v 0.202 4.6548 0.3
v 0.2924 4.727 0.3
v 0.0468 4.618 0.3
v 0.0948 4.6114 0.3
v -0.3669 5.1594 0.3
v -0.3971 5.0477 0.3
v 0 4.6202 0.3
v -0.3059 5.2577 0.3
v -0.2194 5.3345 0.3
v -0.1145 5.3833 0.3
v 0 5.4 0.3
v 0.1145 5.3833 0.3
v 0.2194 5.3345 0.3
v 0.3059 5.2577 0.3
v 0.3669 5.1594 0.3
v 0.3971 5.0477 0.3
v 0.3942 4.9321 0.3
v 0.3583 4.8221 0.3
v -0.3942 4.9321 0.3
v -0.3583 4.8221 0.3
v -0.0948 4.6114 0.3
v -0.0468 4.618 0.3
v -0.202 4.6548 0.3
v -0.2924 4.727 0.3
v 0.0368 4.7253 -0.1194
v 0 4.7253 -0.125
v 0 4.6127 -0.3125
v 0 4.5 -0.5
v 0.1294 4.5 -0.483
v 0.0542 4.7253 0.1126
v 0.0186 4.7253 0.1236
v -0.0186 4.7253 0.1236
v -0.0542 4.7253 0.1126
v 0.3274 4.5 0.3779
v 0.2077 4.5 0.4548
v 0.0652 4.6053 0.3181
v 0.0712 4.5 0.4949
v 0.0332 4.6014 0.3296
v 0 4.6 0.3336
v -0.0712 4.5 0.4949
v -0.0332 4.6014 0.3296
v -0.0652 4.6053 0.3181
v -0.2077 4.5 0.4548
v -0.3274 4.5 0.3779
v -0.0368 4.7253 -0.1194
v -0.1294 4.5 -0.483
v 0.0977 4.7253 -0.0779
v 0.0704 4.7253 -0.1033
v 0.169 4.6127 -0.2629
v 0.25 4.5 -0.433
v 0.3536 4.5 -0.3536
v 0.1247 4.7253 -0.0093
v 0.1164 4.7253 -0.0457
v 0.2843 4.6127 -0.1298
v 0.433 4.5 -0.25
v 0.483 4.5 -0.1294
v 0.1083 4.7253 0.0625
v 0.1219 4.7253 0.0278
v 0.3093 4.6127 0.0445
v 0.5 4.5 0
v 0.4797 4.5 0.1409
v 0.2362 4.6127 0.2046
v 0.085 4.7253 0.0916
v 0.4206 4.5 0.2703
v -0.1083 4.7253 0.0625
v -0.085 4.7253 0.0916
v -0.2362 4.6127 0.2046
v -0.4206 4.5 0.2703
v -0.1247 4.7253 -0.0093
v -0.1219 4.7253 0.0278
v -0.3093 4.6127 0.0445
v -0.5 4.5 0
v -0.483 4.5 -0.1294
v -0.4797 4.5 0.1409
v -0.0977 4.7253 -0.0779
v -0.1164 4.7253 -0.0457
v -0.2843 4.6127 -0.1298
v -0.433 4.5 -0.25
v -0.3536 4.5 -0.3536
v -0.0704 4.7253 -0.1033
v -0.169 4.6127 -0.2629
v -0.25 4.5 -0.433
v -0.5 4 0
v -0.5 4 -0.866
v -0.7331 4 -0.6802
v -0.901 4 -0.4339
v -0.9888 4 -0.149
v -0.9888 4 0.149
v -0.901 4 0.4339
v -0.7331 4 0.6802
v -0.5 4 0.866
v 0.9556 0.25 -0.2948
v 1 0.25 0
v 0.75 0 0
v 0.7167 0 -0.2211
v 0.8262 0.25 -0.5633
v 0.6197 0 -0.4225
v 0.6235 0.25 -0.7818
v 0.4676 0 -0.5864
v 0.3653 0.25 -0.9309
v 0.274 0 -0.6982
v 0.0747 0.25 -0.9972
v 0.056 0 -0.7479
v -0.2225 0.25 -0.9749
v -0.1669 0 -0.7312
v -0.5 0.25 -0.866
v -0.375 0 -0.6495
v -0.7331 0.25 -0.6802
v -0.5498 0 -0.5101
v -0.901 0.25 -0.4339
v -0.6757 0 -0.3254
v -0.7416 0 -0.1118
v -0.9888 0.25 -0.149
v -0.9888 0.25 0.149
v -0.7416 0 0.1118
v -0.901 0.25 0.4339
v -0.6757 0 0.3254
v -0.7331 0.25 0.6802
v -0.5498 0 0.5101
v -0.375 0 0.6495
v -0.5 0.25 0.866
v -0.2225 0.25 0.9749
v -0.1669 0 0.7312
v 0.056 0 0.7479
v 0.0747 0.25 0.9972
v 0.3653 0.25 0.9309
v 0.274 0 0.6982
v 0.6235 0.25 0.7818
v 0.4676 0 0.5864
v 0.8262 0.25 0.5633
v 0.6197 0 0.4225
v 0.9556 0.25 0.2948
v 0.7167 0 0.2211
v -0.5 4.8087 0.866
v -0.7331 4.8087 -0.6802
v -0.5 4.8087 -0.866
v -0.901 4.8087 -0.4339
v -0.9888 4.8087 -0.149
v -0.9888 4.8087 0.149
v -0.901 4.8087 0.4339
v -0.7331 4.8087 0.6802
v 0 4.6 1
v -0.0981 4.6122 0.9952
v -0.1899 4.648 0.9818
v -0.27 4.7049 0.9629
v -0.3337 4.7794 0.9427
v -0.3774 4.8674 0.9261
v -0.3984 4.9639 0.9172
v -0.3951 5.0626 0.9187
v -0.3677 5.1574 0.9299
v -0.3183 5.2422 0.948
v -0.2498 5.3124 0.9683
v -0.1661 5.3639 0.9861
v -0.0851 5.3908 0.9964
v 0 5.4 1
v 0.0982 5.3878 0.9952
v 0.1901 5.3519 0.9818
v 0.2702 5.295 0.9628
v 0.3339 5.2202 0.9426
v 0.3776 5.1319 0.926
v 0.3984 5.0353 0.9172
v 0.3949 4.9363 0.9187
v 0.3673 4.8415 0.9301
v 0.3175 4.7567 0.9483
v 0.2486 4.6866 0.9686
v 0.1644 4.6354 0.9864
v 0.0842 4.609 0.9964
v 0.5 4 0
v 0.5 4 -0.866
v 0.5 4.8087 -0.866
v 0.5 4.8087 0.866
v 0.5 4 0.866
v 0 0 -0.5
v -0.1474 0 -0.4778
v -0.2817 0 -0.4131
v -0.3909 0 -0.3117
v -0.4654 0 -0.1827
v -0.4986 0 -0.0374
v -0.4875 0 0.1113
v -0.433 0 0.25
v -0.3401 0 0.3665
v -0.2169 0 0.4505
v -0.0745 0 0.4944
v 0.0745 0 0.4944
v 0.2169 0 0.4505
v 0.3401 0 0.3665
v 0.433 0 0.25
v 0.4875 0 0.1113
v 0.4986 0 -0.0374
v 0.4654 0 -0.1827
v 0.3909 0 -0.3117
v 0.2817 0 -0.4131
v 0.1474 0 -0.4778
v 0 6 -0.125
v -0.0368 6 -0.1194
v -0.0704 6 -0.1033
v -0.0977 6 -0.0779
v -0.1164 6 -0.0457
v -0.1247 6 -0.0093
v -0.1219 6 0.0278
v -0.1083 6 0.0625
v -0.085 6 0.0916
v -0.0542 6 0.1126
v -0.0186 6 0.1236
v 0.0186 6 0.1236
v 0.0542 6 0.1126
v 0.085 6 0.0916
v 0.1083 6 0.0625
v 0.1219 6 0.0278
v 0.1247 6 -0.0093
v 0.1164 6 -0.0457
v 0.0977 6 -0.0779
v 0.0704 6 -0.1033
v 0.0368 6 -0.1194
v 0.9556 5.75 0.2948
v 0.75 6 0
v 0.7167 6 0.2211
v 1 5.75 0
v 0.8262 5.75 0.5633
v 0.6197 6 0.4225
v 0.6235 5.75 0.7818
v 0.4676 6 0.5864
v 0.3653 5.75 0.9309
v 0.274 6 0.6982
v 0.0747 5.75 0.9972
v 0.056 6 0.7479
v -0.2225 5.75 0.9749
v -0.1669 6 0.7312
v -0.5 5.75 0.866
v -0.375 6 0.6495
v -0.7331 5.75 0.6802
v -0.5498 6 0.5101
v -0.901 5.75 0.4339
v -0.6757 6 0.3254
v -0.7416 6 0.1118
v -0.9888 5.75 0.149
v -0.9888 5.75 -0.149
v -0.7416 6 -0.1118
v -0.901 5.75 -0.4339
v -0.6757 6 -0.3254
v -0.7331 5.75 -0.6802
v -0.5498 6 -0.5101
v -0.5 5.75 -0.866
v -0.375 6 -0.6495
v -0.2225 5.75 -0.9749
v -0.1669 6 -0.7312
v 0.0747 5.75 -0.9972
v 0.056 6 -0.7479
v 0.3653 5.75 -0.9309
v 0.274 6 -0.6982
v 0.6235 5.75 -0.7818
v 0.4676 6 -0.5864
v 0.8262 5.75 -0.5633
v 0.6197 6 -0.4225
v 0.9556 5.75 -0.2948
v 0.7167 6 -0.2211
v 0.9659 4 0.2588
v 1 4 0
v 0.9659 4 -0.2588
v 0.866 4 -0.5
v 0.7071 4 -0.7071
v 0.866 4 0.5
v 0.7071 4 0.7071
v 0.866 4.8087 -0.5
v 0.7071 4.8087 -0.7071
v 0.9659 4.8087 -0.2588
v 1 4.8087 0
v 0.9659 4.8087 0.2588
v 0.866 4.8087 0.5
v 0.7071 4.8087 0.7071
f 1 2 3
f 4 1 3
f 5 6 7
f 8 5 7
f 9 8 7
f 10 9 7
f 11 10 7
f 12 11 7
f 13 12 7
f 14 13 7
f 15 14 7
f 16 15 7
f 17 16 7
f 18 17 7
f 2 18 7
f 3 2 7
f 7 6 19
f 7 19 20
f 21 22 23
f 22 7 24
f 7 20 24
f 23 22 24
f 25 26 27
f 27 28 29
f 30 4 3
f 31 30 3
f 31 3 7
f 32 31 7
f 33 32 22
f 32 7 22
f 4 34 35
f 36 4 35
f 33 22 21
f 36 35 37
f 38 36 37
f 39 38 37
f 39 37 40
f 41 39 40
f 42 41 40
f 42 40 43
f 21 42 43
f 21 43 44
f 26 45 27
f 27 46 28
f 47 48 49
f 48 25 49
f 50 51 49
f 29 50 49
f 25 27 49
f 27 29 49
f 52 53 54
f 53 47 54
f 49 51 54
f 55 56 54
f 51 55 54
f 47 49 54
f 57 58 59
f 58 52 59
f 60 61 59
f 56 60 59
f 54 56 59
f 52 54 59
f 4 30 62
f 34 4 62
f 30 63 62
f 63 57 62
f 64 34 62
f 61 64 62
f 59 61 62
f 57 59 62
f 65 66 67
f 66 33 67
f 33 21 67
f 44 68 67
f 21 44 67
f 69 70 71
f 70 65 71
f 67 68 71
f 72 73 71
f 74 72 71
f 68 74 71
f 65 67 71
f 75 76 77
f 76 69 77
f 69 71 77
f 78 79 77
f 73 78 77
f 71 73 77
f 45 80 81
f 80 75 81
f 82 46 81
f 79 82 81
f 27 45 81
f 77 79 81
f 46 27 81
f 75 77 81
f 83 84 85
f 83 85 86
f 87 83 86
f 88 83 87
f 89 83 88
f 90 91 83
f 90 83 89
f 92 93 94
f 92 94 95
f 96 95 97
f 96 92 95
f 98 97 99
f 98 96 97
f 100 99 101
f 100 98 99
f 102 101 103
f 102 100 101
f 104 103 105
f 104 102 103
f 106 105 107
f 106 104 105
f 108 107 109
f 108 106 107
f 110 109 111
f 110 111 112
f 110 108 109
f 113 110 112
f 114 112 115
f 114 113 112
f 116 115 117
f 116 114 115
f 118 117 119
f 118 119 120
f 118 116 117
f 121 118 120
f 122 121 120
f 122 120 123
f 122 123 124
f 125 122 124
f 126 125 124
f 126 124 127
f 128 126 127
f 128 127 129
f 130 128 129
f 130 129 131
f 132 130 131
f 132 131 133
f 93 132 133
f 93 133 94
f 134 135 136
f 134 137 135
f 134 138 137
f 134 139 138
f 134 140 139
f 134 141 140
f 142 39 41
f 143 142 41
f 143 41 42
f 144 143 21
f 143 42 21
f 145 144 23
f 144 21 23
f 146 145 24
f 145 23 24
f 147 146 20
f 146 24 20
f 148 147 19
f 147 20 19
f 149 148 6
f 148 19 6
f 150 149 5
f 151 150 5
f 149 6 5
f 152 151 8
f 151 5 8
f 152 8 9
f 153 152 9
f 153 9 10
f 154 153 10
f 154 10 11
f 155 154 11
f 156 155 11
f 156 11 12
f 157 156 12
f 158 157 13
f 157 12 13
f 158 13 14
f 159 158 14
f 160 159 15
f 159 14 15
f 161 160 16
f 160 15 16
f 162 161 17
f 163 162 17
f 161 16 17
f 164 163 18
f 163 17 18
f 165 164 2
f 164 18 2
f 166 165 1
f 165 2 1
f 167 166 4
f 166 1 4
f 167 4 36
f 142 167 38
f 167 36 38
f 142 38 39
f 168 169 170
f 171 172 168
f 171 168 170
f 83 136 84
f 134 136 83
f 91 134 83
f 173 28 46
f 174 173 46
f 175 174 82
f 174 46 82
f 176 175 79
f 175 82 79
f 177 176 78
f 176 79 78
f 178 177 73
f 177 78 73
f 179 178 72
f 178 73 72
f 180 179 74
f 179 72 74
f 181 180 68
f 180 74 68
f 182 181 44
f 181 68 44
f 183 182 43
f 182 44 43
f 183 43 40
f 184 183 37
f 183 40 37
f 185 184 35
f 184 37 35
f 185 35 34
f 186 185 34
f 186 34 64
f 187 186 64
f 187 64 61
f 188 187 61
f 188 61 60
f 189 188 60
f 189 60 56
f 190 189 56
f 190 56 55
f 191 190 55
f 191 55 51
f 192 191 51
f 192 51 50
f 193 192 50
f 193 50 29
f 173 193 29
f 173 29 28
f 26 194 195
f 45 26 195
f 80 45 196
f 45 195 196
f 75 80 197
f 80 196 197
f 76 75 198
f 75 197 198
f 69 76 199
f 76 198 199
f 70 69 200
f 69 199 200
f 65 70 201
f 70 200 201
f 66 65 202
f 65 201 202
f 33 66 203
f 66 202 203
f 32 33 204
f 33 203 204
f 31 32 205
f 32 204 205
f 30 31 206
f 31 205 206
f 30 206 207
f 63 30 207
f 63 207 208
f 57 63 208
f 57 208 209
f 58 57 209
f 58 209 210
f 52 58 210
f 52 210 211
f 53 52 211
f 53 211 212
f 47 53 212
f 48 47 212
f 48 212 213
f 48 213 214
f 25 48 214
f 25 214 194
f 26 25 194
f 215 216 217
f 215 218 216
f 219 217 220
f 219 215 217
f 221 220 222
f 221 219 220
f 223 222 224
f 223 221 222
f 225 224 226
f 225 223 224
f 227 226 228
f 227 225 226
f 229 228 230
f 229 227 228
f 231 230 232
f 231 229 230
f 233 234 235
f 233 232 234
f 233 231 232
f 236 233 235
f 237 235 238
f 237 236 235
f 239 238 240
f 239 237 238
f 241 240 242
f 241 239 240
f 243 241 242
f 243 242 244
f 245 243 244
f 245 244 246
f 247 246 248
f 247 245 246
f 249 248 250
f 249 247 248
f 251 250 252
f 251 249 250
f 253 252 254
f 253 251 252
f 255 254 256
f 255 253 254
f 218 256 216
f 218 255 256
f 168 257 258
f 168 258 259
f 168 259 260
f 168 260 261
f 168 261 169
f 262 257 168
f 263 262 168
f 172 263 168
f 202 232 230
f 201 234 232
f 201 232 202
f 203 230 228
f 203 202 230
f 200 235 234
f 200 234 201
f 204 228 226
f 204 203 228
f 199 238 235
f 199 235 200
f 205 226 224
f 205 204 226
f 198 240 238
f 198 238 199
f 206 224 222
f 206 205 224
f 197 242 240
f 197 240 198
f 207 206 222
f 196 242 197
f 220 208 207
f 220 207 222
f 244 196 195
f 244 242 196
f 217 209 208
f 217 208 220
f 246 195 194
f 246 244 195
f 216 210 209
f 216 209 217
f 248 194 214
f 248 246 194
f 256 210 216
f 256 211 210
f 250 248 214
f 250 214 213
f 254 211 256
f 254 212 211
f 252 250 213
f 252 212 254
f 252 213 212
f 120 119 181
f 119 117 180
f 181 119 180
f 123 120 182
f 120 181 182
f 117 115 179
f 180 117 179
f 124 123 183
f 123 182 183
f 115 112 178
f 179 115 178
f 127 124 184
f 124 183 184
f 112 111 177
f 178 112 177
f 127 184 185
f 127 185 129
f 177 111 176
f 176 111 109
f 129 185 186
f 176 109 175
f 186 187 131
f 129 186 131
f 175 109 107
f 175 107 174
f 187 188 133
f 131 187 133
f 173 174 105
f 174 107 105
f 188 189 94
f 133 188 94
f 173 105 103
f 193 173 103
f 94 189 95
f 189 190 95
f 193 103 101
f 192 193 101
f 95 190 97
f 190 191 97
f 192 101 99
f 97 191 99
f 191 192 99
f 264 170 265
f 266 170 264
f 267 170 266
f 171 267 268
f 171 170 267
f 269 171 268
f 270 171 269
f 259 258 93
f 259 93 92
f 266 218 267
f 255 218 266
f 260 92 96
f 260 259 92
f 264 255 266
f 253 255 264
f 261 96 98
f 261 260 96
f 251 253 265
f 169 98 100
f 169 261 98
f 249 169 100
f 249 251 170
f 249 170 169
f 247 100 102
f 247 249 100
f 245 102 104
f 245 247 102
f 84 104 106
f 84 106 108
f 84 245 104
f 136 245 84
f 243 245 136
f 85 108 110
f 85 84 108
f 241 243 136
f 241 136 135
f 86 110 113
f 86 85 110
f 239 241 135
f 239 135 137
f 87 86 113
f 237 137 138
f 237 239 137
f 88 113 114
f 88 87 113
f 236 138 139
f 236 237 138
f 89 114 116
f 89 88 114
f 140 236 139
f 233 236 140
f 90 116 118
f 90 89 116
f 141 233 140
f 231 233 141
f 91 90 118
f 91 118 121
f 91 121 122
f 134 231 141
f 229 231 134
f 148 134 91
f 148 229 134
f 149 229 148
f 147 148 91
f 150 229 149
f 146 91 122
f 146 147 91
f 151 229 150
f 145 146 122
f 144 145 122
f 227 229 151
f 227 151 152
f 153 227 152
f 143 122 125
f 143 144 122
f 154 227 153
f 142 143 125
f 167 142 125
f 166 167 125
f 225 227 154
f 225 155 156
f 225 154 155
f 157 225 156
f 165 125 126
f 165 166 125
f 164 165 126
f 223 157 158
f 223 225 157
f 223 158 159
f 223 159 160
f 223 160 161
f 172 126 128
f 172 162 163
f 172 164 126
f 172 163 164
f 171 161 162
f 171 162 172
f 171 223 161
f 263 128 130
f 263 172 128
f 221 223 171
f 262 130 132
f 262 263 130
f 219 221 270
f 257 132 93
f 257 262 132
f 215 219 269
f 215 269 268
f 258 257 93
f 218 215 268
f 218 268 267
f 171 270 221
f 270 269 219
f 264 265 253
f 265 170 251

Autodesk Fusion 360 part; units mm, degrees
cylinder "CylinderPrimitive1" add diameter 2 height 6 placed x (1, 0, 0) y (0, 0, -1) z (0, 1, 0) at (0, 0, 0)
hole "Hole1" at (0, 0, 0) direction (0, 1, 0) diameter 1 depth 4.5 tip angle 118
hole "Hole2" at (0, 0, 0) direction (0, 1, 0) diameter 0.25 depth 12.5 tip angle 118
chamfer "Chamfer1" distance 0.25 angle 45 2 edges at (-0.9323, 6, 0.3616) (-0.9323, 0, -0.3616) measured on face at (0.7045, 6, 0.0528) measured on face at (0.8291, 0, 0.0621)
ref_plane "WorkPlane1" through (0, 3, 1) normal (0, 0, 1) x (1, 0, 0)
sketch "Sketch2" plane through (0, 3, 1) normal (0, 0, 1) x (1, 0, 0)
  line L0 (-1.3486, 1.8087) -> (-0.5, 1.8087)
  line L1 (-0.5, 1.8087) -> (-0.5, 1)
  line L2 (-0.5, 1) -> (-1.3486, 1)
  line L3 (-1.3486, 1) -> (-1.3486, 1.8087)
  point P0 (0, 2)
hole "Hole3" at (0, 5, 1) direction (0, 0, -1) diameter 0.8 depth 0.7 tip angle 180
extrude "Extrude1" cut sketch "Sketch2" against normal blind 2.5
mirror "Mirror1" about plane through (0, 0, 0) normal (1, 0, 0) of "Extrude1"
